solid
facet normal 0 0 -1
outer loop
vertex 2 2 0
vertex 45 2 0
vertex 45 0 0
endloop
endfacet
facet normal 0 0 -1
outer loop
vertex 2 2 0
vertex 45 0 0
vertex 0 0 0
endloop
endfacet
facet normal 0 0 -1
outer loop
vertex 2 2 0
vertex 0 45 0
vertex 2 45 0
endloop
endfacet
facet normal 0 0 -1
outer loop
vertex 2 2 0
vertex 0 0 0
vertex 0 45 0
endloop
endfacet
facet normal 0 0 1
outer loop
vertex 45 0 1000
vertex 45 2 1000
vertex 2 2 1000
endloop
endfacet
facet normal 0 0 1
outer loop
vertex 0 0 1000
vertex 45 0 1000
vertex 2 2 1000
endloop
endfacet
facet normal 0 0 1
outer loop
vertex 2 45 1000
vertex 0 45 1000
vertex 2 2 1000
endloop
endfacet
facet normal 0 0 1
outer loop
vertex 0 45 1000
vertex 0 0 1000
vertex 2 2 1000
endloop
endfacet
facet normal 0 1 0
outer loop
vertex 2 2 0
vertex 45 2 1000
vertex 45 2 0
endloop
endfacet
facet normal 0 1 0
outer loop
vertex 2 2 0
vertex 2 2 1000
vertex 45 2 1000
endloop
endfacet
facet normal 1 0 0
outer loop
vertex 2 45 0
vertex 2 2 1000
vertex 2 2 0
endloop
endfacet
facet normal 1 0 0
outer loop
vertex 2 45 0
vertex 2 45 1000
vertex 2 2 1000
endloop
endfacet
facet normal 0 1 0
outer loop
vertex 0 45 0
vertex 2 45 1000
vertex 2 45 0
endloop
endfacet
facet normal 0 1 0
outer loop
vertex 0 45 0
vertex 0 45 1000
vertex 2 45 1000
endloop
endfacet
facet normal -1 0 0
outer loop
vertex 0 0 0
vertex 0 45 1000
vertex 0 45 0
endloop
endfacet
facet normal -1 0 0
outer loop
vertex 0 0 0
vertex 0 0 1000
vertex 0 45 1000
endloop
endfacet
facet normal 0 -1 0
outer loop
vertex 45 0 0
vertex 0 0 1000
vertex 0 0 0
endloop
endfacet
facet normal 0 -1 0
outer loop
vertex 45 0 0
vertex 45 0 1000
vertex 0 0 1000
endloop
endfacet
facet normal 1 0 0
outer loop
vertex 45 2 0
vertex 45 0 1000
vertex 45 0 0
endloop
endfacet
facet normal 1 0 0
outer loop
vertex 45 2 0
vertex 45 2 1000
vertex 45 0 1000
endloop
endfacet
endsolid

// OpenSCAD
// file: configuration.scad
aluminum = [0.9, 0.9, 0.9];

vframe_s=45;
vframe_w=2;
vframe_l=1000;

c_wheel_o_r=3; // wheel outer radius
// carriage inner wheel
c_i_wheel_r=25/2;
// carriage outer wheel
c_o_wheel_r=19/2;
// main file
include <configuration.scad>

module vframe(){
    linear_extrude(height=vframe_l)
    polygon(points=[[0,0],[vframe_s,0],[vframe_s,vframe_w],[vframe_w,vframe_w],[vframe_w,vframe_s],[0,vframe_s]]);
}

vframe();
